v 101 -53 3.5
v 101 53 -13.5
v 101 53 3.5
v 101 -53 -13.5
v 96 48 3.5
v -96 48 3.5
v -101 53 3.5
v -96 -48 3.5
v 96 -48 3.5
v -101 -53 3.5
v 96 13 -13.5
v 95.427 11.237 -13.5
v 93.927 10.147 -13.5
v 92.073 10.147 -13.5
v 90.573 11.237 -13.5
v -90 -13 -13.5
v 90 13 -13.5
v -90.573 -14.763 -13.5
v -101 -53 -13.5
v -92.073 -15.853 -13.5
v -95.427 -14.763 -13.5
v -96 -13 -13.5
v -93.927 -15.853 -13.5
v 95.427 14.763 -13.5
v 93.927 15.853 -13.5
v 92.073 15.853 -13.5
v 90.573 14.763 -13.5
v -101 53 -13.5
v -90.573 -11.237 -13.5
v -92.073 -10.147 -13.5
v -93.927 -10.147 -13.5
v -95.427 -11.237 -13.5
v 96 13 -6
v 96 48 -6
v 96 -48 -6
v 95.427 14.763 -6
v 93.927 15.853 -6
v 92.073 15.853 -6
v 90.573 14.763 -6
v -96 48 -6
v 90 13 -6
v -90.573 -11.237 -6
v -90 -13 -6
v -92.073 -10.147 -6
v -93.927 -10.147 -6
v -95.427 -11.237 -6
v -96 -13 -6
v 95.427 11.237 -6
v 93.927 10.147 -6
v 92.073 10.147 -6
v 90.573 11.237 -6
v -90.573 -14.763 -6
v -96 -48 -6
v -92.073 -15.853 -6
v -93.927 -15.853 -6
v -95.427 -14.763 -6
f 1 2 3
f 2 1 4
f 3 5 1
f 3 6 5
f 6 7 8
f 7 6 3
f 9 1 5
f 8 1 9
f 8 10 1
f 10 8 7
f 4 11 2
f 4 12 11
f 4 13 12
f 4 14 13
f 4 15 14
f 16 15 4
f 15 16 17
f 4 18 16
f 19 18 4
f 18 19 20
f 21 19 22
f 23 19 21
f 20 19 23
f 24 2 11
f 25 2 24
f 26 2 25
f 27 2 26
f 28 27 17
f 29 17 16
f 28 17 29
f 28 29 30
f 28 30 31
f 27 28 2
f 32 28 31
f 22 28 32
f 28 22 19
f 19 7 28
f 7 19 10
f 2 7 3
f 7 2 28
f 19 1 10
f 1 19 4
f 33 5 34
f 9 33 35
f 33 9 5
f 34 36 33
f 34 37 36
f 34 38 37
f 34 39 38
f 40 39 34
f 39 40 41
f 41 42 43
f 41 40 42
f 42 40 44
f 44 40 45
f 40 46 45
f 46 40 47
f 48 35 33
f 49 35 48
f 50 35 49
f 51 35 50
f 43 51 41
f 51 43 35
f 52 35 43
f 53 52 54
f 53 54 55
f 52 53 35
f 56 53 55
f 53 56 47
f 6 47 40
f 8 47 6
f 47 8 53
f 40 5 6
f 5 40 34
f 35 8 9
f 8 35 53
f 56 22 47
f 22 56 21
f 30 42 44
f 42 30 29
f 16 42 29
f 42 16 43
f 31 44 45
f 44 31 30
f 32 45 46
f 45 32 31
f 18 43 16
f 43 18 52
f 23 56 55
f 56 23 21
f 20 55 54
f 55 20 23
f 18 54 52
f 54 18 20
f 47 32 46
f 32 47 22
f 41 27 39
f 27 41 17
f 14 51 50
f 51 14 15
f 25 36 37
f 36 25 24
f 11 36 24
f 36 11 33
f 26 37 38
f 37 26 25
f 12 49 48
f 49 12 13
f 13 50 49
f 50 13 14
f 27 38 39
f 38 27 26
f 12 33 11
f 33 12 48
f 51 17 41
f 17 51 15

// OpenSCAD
bottom = 5;
pin=3;



difference() 
    {
    difference ()
        {
        translate([0,0,-1 * bottom])
            cube ([202,106,12 + bottom], true);
        cube ([192,96,12], true);
    }
    union() {
        translate([-96+pin,-16+pin,0])
            cylinder(h=30, r=3, center=true);
        translate([96-pin,16-pin,0])
            cylinder(h=30, r=3, center=true);
    }
}
